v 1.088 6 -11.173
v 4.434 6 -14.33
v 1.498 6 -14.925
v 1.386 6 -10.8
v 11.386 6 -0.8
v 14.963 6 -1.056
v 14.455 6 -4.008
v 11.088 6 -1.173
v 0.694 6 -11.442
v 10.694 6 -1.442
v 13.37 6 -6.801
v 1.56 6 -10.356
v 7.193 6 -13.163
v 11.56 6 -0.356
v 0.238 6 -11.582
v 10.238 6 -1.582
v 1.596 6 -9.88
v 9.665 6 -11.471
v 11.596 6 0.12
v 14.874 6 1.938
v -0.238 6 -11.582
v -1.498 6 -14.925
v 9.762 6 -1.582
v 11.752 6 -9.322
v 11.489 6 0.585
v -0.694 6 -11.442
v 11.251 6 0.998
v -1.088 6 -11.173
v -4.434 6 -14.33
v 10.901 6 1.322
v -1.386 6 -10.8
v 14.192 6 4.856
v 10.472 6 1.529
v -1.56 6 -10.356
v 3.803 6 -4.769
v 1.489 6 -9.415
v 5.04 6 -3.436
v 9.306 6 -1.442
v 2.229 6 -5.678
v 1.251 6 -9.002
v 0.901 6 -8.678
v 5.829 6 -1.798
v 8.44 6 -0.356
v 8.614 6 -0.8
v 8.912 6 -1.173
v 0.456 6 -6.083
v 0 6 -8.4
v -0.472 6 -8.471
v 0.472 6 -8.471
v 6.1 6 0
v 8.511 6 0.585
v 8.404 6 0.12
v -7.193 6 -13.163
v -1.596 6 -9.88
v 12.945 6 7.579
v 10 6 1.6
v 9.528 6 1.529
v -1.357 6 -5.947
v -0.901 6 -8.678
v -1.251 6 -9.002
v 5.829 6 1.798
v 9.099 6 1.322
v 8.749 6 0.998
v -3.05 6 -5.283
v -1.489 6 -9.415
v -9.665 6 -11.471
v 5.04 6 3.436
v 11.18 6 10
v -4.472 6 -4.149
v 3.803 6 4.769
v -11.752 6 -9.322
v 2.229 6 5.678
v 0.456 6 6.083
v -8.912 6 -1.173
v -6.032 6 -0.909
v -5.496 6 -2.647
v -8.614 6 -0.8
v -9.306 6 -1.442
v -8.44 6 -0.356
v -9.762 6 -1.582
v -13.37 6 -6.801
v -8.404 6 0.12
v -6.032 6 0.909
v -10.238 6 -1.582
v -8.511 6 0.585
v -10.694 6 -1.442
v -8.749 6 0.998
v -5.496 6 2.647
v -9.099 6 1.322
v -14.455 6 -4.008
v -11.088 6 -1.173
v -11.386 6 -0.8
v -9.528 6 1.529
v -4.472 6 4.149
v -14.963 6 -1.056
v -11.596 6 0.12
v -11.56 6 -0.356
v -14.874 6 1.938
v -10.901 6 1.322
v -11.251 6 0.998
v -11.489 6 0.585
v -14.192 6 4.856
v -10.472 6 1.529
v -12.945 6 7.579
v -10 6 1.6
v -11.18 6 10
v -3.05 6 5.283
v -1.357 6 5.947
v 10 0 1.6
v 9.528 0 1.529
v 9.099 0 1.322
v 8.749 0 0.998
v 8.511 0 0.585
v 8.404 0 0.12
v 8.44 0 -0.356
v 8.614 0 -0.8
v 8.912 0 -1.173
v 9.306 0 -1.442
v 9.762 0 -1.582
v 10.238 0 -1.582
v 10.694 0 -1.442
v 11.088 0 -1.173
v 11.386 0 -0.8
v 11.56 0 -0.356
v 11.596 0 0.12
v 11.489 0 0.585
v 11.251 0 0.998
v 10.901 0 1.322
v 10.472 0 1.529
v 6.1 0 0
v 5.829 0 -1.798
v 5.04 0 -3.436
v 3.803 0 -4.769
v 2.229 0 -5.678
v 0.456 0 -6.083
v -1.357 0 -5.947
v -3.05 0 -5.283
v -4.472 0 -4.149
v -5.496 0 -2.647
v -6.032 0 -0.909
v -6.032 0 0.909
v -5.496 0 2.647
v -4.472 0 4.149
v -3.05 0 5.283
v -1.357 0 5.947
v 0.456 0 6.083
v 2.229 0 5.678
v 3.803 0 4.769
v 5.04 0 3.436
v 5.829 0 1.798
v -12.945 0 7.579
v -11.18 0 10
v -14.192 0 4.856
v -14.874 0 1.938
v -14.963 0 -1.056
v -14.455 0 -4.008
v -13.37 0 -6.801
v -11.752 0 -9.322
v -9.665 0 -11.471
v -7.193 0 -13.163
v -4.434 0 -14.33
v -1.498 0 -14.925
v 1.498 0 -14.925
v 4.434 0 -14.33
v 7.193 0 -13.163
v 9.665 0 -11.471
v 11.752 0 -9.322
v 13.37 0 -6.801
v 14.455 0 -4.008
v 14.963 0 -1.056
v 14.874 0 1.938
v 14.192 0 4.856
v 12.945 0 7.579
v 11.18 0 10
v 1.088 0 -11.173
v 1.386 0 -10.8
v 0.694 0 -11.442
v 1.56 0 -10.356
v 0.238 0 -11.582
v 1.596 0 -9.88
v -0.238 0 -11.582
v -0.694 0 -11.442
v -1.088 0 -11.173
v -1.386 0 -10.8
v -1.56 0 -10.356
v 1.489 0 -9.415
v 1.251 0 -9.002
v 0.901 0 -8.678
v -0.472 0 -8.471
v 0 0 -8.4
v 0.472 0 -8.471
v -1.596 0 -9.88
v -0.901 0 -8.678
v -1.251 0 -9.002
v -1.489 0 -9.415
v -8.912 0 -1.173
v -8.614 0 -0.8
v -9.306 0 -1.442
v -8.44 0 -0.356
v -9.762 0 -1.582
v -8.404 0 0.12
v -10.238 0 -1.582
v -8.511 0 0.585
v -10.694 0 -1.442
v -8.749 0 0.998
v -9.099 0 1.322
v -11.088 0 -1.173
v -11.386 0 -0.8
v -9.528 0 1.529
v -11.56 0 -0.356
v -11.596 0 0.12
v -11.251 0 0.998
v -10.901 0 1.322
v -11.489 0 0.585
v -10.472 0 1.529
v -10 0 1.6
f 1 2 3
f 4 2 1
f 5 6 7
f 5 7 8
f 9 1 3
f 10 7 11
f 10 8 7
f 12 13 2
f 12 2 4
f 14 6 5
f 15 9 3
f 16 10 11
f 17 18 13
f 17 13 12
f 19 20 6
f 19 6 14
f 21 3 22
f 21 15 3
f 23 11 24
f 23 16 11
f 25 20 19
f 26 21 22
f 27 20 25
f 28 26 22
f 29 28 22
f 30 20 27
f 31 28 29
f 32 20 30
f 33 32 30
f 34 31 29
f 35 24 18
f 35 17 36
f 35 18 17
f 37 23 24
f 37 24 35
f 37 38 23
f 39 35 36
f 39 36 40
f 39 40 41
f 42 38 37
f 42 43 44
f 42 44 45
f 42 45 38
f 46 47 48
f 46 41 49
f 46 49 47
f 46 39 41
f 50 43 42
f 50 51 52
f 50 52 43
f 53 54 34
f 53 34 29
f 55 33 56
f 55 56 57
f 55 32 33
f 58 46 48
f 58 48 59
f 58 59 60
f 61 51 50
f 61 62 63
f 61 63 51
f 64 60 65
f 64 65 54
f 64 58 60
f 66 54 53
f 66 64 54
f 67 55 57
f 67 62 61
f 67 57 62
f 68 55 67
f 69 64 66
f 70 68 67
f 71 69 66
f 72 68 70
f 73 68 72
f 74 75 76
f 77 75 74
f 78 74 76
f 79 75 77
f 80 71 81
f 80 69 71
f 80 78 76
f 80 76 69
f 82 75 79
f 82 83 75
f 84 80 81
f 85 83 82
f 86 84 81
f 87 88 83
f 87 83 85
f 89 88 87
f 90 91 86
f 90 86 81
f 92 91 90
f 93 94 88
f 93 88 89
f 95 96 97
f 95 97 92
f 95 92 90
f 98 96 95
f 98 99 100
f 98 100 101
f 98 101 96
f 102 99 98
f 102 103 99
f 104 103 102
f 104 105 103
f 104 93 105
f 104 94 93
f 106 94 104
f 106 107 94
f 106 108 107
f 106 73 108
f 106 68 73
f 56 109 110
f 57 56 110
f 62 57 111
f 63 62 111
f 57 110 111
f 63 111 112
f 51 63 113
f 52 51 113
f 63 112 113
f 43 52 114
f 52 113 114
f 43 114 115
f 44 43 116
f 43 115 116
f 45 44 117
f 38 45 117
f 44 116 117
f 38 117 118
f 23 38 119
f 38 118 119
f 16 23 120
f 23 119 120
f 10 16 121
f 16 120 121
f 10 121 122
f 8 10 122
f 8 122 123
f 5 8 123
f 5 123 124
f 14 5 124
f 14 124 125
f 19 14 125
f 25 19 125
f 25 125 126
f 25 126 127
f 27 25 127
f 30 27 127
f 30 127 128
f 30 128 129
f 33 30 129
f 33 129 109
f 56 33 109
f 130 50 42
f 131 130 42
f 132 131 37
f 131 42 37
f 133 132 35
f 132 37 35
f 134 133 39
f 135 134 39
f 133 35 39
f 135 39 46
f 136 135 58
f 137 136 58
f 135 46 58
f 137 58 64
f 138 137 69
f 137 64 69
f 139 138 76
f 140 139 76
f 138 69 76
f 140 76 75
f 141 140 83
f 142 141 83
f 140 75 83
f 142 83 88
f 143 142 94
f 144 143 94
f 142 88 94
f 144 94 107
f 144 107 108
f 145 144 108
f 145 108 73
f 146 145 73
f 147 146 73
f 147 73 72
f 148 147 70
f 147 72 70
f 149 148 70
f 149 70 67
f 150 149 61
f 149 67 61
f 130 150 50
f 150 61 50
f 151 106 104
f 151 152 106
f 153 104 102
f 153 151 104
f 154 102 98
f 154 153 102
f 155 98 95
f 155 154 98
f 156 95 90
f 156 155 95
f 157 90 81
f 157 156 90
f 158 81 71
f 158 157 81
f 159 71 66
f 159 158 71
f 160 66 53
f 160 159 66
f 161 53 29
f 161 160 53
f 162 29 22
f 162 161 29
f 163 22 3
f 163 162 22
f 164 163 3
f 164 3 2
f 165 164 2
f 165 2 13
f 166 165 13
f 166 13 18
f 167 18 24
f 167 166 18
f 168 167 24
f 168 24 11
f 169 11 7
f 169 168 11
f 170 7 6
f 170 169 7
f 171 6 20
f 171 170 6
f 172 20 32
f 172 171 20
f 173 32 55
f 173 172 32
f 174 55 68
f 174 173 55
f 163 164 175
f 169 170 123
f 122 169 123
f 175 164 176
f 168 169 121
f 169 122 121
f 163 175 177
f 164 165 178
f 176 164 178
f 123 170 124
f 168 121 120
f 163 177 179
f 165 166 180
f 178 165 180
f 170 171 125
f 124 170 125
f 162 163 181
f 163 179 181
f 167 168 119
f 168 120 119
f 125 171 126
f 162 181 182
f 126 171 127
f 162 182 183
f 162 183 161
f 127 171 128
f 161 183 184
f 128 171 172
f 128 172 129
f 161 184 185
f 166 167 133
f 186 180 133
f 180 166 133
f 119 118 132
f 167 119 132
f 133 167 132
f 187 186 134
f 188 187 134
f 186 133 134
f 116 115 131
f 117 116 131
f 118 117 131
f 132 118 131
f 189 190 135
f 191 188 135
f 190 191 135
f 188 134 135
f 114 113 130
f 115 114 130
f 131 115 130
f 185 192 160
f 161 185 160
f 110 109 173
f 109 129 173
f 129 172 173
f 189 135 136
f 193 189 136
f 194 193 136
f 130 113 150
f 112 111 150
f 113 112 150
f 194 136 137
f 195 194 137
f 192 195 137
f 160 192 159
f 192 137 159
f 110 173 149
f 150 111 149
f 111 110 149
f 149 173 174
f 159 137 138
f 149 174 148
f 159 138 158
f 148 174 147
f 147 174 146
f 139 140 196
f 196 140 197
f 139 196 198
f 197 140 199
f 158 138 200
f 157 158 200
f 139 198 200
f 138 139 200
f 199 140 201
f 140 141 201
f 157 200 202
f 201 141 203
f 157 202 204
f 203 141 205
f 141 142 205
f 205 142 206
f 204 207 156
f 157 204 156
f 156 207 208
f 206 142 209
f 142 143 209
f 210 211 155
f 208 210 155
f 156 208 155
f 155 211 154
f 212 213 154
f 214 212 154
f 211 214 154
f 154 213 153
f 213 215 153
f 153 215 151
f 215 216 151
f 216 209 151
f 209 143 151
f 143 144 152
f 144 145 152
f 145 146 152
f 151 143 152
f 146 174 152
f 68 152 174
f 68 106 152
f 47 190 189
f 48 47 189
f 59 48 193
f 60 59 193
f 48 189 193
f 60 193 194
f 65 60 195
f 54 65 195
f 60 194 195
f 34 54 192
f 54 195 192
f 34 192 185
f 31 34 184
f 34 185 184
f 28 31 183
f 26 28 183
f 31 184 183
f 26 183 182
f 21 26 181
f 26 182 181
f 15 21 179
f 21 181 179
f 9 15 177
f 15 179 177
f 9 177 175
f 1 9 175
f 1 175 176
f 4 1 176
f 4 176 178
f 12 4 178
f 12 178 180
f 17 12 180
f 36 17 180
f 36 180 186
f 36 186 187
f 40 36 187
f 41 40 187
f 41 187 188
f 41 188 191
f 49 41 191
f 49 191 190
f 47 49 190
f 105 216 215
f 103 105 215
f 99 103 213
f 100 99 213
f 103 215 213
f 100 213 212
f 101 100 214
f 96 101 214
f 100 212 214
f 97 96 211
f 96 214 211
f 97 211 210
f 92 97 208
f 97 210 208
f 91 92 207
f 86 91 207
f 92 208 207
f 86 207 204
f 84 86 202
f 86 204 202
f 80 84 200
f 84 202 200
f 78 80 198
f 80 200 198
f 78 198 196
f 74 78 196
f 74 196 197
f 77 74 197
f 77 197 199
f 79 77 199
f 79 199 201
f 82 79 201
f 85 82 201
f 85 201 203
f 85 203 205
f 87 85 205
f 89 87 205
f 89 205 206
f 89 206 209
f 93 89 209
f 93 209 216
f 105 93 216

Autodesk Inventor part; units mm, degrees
ref_plane "YZ Plane" through (0, 0, 0) normal (1, 0, 0) x (0, 1, 0)
ref_plane "XZ Plane" through (0, 0, 0) normal (0, 1, 0) x (-1, 0, 0)
ref_plane "XY Plane" through (0, 0, 0) normal (0, 0, 1) x (1, 0, 0)
sketch "スケッチ1" plane through (0, 0, 0) normal (0, 1, 0) x (-1, 0, 0)
  circle A0 centre (0, 0) radius 15
  dimension "d0" = 30
extrude "押し出し1" add sketch "スケッチ1" along normal blind 6
sketch "スケッチ2" plane through (0, 6, 0) normal (0, 1, 0) x (1, 0, 0)
  arc A0 (2.6833, -3.1) -> (-2.6833, -3.1) centre (0, 0) ccw
  line L0 (-2.6833, -3.1) -> (2.6833, -3.1)
  point P0 (0, -3.1)
  dimension "d3" = 8.2
  dimension "d4" = 3.1
extrude "押し出し2" cut sketch "スケッチ2" against normal blind 6
sketch "スケッチ3" plane through (0, 6, 0) normal (0, 1, 0) x (1, 0, 0)
  circle A0 centre (0, 0) radius 15 projected
  circle A1 centre (0, 0) radius 15 projected
  line L0 (-11.1803, -10) -> (11.1803, -10)
  arc A2 (-11.1803, -10) -> (11.1803, -10) centre (0, 0) ccw
  point P0 (0, -10)
  dimension "d7" = 10
extrude "押し出し3" cut sketch "スケッチ3" against normal blind 6 contours L0 A0 picked at (2.8264, -10.7912)
sketch "スケッチ4" plane through (0, 6, 0) normal (0, 1, 0) x (1, 0, 0)
  circle A0 centre (0, 0) radius 10 construction
  point P0 (-10, 0)
  point P1 (0, 10)
  point P2 (10, 0)
  dimension "d10" = 20
hole "穴1" at (-10, 6, 0) at (0, 6, -10) at (10, 6, 0) direction (0, -1, 0) diameter 3.2 end through all
sketch "スケッチ5" plane through (0, 6, 0) normal (0, 1, 0) x (1, 0, 0)
  circle A0 centre (0, 0) radius 6.1
  dimension "d18" = 12.2
extrude "押し出し4" cut sketch "スケッチ5" against normal blind 10
properties part number "射出_留め具3"
